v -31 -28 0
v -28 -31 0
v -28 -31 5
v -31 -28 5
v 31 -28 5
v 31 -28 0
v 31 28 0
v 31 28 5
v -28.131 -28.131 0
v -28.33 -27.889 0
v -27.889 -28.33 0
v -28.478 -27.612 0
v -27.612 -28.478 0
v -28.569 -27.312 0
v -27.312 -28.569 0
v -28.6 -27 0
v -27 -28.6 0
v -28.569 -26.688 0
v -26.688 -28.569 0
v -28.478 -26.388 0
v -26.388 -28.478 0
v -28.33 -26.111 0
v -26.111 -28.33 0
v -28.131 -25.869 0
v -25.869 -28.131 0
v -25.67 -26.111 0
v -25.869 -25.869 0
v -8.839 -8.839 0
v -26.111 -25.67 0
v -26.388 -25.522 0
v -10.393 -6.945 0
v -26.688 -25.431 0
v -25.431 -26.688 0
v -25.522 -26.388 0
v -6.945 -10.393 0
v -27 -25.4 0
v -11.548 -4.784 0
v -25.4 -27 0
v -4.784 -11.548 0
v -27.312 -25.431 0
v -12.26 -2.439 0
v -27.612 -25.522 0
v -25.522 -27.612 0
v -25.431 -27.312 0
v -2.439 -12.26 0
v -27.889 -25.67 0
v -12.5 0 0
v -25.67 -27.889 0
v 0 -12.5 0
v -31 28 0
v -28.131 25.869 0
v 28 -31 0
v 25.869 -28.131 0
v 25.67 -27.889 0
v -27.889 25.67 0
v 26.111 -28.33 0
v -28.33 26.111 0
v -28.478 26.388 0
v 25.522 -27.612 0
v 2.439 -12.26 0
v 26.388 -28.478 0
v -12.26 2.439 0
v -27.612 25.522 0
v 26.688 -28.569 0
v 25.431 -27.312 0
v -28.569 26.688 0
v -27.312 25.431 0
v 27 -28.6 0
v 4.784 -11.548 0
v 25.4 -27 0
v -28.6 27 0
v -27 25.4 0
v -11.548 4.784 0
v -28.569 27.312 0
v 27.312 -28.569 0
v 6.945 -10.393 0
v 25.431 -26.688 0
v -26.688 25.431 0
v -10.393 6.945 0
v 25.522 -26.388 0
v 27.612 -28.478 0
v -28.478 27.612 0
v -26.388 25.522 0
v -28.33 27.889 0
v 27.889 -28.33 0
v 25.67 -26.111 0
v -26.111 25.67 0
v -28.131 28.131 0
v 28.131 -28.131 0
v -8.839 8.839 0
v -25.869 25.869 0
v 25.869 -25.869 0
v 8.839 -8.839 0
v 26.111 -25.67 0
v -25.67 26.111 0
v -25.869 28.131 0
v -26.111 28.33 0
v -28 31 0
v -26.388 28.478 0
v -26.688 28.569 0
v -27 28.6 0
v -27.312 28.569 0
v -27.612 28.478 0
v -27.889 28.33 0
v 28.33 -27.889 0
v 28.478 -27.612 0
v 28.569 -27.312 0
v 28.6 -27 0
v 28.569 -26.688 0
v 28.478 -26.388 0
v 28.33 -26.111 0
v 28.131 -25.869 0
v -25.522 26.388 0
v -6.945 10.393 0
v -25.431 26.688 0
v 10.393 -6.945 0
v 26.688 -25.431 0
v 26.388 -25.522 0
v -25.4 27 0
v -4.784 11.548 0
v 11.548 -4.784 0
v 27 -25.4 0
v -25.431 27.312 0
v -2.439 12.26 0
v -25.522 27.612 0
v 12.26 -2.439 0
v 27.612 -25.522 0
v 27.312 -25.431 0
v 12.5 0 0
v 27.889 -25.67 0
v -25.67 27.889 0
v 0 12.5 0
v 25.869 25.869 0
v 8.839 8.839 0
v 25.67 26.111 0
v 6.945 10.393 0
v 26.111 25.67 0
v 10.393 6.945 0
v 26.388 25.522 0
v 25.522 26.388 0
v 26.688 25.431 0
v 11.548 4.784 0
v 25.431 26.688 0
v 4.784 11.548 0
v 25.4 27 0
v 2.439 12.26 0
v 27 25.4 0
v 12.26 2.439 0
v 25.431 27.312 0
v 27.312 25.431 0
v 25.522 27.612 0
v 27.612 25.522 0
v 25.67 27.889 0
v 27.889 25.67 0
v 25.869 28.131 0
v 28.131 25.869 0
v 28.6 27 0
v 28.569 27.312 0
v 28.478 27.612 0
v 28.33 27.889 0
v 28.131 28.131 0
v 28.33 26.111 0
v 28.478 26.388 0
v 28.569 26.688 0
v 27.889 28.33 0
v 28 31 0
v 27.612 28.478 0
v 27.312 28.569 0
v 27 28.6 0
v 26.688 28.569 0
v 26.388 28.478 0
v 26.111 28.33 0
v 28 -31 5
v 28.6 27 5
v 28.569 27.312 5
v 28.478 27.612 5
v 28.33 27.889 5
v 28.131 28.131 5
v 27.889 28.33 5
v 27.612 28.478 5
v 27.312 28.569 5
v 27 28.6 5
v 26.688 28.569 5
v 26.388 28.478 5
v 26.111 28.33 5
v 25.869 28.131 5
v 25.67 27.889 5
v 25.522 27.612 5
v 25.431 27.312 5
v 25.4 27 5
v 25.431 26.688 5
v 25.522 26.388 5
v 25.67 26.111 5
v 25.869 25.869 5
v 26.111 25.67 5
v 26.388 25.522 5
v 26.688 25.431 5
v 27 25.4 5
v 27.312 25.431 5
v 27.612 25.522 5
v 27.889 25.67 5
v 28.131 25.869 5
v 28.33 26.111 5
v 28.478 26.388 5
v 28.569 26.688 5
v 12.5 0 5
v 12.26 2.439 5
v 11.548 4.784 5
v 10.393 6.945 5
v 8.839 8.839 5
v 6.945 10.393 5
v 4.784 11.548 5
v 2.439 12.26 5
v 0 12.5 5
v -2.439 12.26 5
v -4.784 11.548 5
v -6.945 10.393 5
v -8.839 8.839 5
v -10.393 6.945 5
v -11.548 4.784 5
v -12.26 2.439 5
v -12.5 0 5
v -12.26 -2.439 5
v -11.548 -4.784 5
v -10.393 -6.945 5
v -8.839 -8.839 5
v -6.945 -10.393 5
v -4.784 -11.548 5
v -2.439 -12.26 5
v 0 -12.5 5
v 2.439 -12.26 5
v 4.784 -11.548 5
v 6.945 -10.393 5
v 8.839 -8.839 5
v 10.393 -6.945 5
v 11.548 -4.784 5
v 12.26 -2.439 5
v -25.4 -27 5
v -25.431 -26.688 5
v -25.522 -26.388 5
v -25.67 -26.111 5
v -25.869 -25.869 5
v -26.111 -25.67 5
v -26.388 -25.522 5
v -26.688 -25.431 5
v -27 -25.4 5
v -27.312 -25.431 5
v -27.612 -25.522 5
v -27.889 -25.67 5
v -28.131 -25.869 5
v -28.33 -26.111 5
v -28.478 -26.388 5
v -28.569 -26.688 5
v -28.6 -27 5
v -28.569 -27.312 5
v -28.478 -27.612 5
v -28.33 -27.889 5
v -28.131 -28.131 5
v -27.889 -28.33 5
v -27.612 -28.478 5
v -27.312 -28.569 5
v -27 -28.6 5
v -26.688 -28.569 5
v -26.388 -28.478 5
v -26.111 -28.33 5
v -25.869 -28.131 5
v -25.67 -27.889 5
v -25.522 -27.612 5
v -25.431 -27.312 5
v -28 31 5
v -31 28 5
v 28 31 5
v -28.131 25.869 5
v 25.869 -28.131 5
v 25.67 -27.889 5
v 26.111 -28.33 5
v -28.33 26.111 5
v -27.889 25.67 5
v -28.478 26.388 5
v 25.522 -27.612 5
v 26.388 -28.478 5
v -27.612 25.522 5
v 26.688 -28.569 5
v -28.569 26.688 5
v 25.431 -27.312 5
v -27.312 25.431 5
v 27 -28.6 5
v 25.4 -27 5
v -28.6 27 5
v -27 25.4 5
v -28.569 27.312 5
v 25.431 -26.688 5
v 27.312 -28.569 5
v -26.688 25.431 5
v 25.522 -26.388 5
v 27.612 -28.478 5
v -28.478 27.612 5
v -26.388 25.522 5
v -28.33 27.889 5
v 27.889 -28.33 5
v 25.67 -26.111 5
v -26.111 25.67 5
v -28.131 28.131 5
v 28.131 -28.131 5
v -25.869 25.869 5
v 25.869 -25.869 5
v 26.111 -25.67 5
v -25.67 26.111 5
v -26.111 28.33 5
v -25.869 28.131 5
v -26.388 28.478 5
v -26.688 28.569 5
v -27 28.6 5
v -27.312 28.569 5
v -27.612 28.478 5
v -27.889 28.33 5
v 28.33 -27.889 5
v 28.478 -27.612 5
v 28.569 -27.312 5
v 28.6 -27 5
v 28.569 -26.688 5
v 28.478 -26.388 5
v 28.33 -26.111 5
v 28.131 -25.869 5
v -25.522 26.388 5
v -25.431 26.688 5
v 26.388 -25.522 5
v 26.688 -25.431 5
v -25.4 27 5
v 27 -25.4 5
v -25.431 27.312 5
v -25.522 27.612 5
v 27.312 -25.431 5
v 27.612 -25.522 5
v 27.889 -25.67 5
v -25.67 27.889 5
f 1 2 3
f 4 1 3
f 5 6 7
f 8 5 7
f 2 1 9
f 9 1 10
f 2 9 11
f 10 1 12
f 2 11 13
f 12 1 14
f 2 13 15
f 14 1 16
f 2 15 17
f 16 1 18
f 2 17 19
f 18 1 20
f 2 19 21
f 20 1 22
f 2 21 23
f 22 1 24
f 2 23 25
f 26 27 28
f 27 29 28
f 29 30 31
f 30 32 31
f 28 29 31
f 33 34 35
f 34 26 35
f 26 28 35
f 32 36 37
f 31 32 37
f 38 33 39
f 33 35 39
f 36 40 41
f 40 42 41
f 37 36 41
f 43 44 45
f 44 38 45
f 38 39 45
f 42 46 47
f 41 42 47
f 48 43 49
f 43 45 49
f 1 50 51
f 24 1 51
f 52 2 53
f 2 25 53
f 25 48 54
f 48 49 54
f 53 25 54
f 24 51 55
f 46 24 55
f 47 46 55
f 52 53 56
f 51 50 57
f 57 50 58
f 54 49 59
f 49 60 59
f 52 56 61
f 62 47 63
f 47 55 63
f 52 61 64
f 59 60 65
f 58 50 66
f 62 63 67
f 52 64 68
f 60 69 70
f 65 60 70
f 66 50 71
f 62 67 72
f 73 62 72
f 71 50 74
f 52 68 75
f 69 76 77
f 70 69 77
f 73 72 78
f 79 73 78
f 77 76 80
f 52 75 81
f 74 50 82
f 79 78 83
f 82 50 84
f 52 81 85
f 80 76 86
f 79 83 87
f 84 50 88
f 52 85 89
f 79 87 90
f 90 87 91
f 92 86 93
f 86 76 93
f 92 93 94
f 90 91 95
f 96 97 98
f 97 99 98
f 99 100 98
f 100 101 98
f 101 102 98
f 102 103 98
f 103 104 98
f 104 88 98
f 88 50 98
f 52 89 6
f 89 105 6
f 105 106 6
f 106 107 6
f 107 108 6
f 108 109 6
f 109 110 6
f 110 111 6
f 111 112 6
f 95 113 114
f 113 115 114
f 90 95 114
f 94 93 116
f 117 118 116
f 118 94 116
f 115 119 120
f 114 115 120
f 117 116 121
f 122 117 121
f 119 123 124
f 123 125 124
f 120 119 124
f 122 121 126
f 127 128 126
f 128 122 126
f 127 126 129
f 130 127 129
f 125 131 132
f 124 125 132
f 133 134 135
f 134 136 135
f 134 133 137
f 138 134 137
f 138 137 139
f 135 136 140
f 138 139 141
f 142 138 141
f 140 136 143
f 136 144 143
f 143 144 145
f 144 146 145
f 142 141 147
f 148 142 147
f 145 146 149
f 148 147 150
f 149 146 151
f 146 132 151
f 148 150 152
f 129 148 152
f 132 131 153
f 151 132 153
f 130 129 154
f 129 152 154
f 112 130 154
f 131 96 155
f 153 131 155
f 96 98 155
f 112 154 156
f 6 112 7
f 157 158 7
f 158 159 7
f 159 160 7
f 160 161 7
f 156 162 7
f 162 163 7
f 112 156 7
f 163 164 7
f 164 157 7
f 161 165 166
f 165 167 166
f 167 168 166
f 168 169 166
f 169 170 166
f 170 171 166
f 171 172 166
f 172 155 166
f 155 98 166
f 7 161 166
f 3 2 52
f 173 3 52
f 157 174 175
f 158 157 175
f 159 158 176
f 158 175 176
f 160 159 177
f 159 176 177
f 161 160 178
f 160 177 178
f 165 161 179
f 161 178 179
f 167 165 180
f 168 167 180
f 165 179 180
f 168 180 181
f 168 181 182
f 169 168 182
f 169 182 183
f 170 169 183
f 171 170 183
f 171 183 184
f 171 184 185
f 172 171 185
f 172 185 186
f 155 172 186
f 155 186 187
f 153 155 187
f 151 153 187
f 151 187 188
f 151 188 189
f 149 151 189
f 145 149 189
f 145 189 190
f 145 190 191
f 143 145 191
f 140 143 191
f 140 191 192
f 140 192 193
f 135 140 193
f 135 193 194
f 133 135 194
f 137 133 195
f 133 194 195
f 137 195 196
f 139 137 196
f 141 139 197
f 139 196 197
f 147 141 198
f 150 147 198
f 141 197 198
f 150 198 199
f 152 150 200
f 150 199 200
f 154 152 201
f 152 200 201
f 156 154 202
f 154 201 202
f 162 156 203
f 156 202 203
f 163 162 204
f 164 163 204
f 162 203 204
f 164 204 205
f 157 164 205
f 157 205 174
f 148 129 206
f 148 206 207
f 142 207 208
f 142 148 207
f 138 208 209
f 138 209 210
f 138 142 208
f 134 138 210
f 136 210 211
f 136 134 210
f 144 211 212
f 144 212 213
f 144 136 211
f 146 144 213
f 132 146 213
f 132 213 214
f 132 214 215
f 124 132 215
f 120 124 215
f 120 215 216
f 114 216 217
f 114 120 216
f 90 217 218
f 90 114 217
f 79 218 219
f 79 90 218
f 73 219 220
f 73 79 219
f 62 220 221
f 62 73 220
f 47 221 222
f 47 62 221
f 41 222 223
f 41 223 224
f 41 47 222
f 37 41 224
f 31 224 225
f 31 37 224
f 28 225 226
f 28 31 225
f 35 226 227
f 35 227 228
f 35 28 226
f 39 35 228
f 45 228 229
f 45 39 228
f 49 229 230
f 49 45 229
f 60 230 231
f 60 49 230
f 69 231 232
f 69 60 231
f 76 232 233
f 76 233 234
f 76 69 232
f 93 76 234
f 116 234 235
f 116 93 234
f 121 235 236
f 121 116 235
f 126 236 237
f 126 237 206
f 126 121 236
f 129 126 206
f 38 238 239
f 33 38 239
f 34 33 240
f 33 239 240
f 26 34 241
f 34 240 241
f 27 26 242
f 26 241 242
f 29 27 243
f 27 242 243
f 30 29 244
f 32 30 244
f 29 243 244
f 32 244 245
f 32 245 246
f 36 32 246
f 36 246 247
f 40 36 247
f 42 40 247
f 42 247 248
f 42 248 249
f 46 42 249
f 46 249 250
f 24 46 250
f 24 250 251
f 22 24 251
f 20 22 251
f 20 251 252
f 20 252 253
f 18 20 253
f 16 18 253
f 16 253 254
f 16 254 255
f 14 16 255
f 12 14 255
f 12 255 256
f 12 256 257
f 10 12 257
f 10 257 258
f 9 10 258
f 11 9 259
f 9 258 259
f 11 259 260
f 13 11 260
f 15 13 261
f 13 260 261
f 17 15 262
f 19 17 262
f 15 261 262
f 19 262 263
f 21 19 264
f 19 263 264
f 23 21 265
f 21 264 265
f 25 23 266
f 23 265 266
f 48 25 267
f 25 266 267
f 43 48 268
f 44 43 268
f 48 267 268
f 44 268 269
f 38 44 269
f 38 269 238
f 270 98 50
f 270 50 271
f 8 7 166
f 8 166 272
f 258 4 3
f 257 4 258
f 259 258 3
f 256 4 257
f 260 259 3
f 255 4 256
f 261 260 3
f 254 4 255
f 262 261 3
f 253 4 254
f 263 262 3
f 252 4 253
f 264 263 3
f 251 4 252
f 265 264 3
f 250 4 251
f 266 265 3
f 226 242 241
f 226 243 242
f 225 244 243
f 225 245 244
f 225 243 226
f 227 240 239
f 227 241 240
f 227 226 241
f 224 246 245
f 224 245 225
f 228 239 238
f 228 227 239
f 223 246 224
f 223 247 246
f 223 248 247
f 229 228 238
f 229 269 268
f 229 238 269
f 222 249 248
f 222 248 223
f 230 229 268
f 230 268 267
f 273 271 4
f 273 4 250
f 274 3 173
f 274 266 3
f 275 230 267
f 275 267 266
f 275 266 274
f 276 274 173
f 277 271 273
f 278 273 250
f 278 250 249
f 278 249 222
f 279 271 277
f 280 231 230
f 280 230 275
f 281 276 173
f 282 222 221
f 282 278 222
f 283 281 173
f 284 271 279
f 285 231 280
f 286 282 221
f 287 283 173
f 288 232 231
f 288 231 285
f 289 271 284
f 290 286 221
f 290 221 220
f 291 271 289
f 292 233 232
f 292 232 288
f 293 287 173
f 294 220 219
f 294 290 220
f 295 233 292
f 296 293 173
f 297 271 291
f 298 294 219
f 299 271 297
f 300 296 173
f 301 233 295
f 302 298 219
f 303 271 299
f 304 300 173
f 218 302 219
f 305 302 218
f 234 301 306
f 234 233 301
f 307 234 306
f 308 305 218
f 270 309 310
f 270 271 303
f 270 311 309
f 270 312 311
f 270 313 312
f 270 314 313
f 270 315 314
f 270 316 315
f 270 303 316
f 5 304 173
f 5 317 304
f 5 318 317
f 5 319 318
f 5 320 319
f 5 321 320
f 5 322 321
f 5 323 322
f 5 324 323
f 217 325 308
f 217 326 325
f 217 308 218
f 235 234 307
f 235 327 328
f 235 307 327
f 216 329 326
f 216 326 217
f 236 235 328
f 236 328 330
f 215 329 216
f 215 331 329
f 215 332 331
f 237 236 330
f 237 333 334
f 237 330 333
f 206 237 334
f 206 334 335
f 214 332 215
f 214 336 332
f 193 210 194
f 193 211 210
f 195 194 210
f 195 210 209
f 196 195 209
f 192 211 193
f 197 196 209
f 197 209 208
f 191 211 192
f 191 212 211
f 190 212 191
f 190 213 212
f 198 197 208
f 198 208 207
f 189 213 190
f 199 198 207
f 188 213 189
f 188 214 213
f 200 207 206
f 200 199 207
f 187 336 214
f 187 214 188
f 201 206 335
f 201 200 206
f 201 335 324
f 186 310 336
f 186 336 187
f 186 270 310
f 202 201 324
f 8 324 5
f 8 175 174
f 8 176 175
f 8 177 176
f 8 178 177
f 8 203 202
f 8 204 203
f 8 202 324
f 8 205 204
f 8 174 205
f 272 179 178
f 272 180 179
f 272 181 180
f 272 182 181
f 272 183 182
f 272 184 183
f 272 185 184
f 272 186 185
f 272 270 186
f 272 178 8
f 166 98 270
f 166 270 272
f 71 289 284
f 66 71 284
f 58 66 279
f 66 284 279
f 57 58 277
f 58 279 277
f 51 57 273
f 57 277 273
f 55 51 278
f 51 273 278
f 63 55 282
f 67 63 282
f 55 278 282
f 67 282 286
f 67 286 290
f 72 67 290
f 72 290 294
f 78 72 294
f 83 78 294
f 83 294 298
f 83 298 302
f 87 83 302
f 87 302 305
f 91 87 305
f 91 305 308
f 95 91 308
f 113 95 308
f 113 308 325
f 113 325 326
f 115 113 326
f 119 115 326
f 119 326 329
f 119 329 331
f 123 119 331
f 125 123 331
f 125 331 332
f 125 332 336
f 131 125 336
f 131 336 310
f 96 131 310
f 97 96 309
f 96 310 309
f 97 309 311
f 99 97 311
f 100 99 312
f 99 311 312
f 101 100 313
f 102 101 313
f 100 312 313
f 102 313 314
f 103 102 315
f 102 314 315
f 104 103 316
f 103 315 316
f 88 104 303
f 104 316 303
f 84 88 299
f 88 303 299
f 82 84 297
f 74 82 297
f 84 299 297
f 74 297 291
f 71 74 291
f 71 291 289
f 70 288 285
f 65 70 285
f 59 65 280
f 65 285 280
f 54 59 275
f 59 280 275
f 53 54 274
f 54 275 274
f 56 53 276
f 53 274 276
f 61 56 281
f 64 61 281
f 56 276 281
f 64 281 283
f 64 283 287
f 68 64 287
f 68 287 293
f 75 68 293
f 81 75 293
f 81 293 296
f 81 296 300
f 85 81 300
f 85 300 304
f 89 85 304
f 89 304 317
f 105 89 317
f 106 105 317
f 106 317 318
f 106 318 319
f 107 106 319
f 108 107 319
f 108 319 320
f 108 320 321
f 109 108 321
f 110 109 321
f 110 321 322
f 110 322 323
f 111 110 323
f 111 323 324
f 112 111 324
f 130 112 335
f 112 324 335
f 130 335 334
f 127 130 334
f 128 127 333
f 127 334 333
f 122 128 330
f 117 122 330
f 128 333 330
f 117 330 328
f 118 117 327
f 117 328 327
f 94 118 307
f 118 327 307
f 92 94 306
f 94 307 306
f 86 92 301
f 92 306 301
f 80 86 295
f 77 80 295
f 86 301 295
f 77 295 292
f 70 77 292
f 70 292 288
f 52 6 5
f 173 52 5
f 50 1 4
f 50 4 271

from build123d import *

# Parameters (mm, degrees)
SKETCH_1_W          = 62
SKETCH_1_H          = 62
SKETCH_1_R          = 12.5
EXTRUDE_1_DEPTH     = 5
CHAMFER_1_SIZE      = 3
SKETCH_2_R          = 1.6
CUT_EXTRUDE_1_DEPTH = 45.124822946


with BuildPart() as part:
    # ｽｹｯﾁ1 → ﾎﾞｽ - 押し出し1 (new body)
    with BuildSketch(Plane.XY):
        Rectangle(SKETCH_1_W, SKETCH_1_H)
        Circle(SKETCH_1_R, mode=Mode.SUBTRACT)
    extrude(amount=EXTRUDE_1_DEPTH)

    # 面取り1
    chamfer_1_edges = [part.edges().sort_by_distance(p)[0] for p in [
        (-31, 31, 2.5),
        (31, 31, 2.5),
        (31, -31, 2.5),
        (-31, -31, 2.5),
    ]]
    chamfer(chamfer_1_edges, length=CHAMFER_1_SIZE)

    # ｽｹｯﾁ2 → ｶｯﾄ - 押し出し1 (cut, through all)
    with BuildSketch(Plane.XY.offset(5)):
        with Locations((27, 27)):
            Circle(SKETCH_2_R)
        with Locations(Location((-27, 27, 0), (0, 0, 180))):
            Circle(SKETCH_2_R)
        with Locations(Location((27, -27, 0), (0, 0, 180))):
            Circle(SKETCH_2_R)
        with Locations((-27, -27)):
            Circle(SKETCH_2_R)
    extrude(amount=-CUT_EXTRUDE_1_DEPTH, mode=Mode.SUBTRACT)


solid = part.part
